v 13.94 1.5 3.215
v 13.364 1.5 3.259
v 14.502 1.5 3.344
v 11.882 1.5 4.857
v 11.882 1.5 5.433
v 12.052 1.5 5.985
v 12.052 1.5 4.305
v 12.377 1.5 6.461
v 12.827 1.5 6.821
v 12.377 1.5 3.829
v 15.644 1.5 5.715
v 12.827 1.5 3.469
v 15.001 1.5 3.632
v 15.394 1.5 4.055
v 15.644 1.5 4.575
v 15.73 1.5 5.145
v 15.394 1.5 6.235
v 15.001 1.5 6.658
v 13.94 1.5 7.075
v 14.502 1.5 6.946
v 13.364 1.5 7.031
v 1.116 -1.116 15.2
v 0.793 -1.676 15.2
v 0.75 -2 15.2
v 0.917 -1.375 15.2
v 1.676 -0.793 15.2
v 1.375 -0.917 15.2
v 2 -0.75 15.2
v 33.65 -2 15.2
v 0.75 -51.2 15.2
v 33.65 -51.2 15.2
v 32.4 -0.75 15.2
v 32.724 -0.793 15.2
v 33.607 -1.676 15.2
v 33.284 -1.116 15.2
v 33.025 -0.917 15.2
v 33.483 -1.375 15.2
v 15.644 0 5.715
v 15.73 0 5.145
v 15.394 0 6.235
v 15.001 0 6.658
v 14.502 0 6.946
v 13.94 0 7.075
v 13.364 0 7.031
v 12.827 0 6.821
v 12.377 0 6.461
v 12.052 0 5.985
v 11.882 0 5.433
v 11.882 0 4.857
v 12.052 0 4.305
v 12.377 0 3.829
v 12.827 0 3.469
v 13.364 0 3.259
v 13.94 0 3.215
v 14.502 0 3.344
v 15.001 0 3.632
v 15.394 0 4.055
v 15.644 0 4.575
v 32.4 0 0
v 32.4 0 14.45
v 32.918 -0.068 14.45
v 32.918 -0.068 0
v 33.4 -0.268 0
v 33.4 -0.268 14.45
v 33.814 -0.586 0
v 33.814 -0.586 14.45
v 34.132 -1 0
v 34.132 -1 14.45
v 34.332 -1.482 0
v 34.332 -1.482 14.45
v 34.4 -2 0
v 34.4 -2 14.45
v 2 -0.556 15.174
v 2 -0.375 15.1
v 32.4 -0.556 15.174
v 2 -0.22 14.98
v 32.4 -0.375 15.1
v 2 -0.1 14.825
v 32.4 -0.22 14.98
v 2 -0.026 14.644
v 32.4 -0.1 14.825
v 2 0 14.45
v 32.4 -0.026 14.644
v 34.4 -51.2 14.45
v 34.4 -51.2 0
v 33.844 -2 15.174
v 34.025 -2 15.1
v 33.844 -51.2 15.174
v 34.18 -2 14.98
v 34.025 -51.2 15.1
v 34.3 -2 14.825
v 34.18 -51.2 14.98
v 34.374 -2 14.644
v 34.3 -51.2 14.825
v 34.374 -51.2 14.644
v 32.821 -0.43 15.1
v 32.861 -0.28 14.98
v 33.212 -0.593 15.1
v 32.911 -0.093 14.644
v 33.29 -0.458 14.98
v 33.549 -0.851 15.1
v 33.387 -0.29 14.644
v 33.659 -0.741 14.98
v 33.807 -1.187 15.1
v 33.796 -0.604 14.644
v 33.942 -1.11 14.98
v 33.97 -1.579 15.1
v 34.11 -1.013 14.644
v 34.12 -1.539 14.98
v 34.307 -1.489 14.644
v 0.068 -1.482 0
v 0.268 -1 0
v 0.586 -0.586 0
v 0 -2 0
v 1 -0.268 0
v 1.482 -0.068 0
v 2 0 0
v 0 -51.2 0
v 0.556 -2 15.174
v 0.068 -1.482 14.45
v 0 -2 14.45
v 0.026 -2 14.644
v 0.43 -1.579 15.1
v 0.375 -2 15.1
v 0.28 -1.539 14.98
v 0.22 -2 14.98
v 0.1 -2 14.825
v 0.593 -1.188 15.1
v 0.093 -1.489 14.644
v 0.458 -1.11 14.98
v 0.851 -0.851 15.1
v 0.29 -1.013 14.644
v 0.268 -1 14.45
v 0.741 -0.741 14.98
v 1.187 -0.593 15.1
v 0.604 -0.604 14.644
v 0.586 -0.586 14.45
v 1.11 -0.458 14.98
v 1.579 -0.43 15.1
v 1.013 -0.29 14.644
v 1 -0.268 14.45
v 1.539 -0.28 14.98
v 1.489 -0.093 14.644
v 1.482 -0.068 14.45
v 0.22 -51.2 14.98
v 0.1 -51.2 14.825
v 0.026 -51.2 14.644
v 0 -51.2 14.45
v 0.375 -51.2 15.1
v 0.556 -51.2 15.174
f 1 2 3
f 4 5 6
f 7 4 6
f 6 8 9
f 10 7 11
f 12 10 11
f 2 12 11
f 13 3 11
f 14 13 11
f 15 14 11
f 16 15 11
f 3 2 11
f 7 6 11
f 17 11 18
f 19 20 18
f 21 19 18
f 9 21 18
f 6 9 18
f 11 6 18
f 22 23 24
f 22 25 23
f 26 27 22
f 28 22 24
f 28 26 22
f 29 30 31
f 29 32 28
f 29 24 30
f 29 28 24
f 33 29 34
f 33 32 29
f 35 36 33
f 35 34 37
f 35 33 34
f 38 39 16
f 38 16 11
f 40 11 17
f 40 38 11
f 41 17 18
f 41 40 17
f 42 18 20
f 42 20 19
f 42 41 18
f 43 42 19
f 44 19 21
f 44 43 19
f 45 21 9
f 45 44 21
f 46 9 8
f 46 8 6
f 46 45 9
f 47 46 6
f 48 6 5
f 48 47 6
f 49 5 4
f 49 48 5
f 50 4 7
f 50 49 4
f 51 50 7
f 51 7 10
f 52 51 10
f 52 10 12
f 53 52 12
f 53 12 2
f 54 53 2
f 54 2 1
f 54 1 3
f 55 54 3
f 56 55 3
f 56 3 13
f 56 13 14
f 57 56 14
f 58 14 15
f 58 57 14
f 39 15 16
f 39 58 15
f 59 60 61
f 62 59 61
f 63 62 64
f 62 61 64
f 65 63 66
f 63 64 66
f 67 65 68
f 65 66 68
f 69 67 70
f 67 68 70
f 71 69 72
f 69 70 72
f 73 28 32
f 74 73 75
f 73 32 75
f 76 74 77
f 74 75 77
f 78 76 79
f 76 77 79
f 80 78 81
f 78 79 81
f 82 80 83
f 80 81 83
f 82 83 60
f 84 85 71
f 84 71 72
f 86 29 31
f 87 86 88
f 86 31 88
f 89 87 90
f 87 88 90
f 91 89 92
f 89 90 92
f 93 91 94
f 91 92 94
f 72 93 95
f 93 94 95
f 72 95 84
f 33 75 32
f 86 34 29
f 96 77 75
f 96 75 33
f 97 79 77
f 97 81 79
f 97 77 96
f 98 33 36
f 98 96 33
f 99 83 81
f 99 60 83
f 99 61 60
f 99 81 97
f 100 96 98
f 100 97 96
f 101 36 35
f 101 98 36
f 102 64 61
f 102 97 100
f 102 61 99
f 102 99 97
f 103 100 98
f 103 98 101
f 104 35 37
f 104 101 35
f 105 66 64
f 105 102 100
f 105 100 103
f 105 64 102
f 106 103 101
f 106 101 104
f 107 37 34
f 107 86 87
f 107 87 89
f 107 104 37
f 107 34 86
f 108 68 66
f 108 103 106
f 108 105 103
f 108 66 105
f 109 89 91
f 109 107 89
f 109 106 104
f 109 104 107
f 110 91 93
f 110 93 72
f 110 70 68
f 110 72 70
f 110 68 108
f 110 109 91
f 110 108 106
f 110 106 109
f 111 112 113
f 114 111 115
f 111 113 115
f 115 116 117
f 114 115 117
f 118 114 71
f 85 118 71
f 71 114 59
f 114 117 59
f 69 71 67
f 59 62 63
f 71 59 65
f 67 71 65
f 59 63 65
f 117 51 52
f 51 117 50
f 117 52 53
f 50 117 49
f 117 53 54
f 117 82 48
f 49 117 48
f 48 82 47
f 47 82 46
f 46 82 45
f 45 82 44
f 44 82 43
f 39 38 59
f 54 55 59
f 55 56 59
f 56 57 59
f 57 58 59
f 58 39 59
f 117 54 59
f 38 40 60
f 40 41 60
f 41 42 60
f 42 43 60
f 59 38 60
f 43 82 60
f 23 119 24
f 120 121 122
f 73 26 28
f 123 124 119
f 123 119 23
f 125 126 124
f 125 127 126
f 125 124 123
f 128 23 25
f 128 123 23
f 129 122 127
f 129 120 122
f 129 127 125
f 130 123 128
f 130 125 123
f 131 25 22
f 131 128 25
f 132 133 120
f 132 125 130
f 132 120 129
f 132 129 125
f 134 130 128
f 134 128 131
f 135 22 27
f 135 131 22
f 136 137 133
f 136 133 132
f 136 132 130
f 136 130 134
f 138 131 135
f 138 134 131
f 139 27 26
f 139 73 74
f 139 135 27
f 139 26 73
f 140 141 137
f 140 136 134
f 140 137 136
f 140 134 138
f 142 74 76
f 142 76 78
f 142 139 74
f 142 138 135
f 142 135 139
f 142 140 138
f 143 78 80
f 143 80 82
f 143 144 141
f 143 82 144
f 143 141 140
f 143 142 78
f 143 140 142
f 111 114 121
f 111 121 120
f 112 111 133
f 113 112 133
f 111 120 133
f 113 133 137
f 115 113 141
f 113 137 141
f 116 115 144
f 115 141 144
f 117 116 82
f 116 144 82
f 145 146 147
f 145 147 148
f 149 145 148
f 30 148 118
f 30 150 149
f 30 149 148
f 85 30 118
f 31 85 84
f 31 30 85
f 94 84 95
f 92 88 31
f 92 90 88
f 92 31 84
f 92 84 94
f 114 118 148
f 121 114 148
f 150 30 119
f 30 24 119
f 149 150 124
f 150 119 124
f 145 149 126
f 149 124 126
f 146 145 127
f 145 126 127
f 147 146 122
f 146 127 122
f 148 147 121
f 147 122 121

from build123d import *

# Parameters (mm, degrees)
F0_W     = 34.4
F0_H     = 15.2
F0_R     = 1.935
F1_DEPTH = 51.2
F2_DEPTH = 1.5
F3_R     = 2
F4_R     = 0.75


with BuildPart() as f1:
    # F0 (on Front) → F1 (new body)
    with BuildSketch(Plane.XZ):
        with Locations((17.2, 7.6)):
            Rectangle(F0_W, F0_H)
        with Locations((13.795, 5.145)):
            Circle(F0_R, mode=Mode.SUBTRACT)
        with Locations((13.795, 5.145)):
            Circle(F0_R)
    extrude(amount=F1_DEPTH)

    # F0 (on Front) → F2 (join)
    with BuildSketch(Plane.XZ):
        with Locations((13.795, 5.145)):
            Circle(F0_R)
    extrude(amount=-F2_DEPTH)

    # F3
    f3_edges = [f1.edges().sort_by_distance(p)[0] for p in [
        (34.4, 0, 7.6),
        (0, 0, 7.6),
    ]]
    fillet(f3_edges, radius=F3_R)

    # F4
    f4_edges = [f1.edges().sort_by_distance(p)[0] for p in [
        (34.4, -26.6, 15.2),
    ]]
    fillet(f4_edges, radius=F4_R)


solid = f1.part
